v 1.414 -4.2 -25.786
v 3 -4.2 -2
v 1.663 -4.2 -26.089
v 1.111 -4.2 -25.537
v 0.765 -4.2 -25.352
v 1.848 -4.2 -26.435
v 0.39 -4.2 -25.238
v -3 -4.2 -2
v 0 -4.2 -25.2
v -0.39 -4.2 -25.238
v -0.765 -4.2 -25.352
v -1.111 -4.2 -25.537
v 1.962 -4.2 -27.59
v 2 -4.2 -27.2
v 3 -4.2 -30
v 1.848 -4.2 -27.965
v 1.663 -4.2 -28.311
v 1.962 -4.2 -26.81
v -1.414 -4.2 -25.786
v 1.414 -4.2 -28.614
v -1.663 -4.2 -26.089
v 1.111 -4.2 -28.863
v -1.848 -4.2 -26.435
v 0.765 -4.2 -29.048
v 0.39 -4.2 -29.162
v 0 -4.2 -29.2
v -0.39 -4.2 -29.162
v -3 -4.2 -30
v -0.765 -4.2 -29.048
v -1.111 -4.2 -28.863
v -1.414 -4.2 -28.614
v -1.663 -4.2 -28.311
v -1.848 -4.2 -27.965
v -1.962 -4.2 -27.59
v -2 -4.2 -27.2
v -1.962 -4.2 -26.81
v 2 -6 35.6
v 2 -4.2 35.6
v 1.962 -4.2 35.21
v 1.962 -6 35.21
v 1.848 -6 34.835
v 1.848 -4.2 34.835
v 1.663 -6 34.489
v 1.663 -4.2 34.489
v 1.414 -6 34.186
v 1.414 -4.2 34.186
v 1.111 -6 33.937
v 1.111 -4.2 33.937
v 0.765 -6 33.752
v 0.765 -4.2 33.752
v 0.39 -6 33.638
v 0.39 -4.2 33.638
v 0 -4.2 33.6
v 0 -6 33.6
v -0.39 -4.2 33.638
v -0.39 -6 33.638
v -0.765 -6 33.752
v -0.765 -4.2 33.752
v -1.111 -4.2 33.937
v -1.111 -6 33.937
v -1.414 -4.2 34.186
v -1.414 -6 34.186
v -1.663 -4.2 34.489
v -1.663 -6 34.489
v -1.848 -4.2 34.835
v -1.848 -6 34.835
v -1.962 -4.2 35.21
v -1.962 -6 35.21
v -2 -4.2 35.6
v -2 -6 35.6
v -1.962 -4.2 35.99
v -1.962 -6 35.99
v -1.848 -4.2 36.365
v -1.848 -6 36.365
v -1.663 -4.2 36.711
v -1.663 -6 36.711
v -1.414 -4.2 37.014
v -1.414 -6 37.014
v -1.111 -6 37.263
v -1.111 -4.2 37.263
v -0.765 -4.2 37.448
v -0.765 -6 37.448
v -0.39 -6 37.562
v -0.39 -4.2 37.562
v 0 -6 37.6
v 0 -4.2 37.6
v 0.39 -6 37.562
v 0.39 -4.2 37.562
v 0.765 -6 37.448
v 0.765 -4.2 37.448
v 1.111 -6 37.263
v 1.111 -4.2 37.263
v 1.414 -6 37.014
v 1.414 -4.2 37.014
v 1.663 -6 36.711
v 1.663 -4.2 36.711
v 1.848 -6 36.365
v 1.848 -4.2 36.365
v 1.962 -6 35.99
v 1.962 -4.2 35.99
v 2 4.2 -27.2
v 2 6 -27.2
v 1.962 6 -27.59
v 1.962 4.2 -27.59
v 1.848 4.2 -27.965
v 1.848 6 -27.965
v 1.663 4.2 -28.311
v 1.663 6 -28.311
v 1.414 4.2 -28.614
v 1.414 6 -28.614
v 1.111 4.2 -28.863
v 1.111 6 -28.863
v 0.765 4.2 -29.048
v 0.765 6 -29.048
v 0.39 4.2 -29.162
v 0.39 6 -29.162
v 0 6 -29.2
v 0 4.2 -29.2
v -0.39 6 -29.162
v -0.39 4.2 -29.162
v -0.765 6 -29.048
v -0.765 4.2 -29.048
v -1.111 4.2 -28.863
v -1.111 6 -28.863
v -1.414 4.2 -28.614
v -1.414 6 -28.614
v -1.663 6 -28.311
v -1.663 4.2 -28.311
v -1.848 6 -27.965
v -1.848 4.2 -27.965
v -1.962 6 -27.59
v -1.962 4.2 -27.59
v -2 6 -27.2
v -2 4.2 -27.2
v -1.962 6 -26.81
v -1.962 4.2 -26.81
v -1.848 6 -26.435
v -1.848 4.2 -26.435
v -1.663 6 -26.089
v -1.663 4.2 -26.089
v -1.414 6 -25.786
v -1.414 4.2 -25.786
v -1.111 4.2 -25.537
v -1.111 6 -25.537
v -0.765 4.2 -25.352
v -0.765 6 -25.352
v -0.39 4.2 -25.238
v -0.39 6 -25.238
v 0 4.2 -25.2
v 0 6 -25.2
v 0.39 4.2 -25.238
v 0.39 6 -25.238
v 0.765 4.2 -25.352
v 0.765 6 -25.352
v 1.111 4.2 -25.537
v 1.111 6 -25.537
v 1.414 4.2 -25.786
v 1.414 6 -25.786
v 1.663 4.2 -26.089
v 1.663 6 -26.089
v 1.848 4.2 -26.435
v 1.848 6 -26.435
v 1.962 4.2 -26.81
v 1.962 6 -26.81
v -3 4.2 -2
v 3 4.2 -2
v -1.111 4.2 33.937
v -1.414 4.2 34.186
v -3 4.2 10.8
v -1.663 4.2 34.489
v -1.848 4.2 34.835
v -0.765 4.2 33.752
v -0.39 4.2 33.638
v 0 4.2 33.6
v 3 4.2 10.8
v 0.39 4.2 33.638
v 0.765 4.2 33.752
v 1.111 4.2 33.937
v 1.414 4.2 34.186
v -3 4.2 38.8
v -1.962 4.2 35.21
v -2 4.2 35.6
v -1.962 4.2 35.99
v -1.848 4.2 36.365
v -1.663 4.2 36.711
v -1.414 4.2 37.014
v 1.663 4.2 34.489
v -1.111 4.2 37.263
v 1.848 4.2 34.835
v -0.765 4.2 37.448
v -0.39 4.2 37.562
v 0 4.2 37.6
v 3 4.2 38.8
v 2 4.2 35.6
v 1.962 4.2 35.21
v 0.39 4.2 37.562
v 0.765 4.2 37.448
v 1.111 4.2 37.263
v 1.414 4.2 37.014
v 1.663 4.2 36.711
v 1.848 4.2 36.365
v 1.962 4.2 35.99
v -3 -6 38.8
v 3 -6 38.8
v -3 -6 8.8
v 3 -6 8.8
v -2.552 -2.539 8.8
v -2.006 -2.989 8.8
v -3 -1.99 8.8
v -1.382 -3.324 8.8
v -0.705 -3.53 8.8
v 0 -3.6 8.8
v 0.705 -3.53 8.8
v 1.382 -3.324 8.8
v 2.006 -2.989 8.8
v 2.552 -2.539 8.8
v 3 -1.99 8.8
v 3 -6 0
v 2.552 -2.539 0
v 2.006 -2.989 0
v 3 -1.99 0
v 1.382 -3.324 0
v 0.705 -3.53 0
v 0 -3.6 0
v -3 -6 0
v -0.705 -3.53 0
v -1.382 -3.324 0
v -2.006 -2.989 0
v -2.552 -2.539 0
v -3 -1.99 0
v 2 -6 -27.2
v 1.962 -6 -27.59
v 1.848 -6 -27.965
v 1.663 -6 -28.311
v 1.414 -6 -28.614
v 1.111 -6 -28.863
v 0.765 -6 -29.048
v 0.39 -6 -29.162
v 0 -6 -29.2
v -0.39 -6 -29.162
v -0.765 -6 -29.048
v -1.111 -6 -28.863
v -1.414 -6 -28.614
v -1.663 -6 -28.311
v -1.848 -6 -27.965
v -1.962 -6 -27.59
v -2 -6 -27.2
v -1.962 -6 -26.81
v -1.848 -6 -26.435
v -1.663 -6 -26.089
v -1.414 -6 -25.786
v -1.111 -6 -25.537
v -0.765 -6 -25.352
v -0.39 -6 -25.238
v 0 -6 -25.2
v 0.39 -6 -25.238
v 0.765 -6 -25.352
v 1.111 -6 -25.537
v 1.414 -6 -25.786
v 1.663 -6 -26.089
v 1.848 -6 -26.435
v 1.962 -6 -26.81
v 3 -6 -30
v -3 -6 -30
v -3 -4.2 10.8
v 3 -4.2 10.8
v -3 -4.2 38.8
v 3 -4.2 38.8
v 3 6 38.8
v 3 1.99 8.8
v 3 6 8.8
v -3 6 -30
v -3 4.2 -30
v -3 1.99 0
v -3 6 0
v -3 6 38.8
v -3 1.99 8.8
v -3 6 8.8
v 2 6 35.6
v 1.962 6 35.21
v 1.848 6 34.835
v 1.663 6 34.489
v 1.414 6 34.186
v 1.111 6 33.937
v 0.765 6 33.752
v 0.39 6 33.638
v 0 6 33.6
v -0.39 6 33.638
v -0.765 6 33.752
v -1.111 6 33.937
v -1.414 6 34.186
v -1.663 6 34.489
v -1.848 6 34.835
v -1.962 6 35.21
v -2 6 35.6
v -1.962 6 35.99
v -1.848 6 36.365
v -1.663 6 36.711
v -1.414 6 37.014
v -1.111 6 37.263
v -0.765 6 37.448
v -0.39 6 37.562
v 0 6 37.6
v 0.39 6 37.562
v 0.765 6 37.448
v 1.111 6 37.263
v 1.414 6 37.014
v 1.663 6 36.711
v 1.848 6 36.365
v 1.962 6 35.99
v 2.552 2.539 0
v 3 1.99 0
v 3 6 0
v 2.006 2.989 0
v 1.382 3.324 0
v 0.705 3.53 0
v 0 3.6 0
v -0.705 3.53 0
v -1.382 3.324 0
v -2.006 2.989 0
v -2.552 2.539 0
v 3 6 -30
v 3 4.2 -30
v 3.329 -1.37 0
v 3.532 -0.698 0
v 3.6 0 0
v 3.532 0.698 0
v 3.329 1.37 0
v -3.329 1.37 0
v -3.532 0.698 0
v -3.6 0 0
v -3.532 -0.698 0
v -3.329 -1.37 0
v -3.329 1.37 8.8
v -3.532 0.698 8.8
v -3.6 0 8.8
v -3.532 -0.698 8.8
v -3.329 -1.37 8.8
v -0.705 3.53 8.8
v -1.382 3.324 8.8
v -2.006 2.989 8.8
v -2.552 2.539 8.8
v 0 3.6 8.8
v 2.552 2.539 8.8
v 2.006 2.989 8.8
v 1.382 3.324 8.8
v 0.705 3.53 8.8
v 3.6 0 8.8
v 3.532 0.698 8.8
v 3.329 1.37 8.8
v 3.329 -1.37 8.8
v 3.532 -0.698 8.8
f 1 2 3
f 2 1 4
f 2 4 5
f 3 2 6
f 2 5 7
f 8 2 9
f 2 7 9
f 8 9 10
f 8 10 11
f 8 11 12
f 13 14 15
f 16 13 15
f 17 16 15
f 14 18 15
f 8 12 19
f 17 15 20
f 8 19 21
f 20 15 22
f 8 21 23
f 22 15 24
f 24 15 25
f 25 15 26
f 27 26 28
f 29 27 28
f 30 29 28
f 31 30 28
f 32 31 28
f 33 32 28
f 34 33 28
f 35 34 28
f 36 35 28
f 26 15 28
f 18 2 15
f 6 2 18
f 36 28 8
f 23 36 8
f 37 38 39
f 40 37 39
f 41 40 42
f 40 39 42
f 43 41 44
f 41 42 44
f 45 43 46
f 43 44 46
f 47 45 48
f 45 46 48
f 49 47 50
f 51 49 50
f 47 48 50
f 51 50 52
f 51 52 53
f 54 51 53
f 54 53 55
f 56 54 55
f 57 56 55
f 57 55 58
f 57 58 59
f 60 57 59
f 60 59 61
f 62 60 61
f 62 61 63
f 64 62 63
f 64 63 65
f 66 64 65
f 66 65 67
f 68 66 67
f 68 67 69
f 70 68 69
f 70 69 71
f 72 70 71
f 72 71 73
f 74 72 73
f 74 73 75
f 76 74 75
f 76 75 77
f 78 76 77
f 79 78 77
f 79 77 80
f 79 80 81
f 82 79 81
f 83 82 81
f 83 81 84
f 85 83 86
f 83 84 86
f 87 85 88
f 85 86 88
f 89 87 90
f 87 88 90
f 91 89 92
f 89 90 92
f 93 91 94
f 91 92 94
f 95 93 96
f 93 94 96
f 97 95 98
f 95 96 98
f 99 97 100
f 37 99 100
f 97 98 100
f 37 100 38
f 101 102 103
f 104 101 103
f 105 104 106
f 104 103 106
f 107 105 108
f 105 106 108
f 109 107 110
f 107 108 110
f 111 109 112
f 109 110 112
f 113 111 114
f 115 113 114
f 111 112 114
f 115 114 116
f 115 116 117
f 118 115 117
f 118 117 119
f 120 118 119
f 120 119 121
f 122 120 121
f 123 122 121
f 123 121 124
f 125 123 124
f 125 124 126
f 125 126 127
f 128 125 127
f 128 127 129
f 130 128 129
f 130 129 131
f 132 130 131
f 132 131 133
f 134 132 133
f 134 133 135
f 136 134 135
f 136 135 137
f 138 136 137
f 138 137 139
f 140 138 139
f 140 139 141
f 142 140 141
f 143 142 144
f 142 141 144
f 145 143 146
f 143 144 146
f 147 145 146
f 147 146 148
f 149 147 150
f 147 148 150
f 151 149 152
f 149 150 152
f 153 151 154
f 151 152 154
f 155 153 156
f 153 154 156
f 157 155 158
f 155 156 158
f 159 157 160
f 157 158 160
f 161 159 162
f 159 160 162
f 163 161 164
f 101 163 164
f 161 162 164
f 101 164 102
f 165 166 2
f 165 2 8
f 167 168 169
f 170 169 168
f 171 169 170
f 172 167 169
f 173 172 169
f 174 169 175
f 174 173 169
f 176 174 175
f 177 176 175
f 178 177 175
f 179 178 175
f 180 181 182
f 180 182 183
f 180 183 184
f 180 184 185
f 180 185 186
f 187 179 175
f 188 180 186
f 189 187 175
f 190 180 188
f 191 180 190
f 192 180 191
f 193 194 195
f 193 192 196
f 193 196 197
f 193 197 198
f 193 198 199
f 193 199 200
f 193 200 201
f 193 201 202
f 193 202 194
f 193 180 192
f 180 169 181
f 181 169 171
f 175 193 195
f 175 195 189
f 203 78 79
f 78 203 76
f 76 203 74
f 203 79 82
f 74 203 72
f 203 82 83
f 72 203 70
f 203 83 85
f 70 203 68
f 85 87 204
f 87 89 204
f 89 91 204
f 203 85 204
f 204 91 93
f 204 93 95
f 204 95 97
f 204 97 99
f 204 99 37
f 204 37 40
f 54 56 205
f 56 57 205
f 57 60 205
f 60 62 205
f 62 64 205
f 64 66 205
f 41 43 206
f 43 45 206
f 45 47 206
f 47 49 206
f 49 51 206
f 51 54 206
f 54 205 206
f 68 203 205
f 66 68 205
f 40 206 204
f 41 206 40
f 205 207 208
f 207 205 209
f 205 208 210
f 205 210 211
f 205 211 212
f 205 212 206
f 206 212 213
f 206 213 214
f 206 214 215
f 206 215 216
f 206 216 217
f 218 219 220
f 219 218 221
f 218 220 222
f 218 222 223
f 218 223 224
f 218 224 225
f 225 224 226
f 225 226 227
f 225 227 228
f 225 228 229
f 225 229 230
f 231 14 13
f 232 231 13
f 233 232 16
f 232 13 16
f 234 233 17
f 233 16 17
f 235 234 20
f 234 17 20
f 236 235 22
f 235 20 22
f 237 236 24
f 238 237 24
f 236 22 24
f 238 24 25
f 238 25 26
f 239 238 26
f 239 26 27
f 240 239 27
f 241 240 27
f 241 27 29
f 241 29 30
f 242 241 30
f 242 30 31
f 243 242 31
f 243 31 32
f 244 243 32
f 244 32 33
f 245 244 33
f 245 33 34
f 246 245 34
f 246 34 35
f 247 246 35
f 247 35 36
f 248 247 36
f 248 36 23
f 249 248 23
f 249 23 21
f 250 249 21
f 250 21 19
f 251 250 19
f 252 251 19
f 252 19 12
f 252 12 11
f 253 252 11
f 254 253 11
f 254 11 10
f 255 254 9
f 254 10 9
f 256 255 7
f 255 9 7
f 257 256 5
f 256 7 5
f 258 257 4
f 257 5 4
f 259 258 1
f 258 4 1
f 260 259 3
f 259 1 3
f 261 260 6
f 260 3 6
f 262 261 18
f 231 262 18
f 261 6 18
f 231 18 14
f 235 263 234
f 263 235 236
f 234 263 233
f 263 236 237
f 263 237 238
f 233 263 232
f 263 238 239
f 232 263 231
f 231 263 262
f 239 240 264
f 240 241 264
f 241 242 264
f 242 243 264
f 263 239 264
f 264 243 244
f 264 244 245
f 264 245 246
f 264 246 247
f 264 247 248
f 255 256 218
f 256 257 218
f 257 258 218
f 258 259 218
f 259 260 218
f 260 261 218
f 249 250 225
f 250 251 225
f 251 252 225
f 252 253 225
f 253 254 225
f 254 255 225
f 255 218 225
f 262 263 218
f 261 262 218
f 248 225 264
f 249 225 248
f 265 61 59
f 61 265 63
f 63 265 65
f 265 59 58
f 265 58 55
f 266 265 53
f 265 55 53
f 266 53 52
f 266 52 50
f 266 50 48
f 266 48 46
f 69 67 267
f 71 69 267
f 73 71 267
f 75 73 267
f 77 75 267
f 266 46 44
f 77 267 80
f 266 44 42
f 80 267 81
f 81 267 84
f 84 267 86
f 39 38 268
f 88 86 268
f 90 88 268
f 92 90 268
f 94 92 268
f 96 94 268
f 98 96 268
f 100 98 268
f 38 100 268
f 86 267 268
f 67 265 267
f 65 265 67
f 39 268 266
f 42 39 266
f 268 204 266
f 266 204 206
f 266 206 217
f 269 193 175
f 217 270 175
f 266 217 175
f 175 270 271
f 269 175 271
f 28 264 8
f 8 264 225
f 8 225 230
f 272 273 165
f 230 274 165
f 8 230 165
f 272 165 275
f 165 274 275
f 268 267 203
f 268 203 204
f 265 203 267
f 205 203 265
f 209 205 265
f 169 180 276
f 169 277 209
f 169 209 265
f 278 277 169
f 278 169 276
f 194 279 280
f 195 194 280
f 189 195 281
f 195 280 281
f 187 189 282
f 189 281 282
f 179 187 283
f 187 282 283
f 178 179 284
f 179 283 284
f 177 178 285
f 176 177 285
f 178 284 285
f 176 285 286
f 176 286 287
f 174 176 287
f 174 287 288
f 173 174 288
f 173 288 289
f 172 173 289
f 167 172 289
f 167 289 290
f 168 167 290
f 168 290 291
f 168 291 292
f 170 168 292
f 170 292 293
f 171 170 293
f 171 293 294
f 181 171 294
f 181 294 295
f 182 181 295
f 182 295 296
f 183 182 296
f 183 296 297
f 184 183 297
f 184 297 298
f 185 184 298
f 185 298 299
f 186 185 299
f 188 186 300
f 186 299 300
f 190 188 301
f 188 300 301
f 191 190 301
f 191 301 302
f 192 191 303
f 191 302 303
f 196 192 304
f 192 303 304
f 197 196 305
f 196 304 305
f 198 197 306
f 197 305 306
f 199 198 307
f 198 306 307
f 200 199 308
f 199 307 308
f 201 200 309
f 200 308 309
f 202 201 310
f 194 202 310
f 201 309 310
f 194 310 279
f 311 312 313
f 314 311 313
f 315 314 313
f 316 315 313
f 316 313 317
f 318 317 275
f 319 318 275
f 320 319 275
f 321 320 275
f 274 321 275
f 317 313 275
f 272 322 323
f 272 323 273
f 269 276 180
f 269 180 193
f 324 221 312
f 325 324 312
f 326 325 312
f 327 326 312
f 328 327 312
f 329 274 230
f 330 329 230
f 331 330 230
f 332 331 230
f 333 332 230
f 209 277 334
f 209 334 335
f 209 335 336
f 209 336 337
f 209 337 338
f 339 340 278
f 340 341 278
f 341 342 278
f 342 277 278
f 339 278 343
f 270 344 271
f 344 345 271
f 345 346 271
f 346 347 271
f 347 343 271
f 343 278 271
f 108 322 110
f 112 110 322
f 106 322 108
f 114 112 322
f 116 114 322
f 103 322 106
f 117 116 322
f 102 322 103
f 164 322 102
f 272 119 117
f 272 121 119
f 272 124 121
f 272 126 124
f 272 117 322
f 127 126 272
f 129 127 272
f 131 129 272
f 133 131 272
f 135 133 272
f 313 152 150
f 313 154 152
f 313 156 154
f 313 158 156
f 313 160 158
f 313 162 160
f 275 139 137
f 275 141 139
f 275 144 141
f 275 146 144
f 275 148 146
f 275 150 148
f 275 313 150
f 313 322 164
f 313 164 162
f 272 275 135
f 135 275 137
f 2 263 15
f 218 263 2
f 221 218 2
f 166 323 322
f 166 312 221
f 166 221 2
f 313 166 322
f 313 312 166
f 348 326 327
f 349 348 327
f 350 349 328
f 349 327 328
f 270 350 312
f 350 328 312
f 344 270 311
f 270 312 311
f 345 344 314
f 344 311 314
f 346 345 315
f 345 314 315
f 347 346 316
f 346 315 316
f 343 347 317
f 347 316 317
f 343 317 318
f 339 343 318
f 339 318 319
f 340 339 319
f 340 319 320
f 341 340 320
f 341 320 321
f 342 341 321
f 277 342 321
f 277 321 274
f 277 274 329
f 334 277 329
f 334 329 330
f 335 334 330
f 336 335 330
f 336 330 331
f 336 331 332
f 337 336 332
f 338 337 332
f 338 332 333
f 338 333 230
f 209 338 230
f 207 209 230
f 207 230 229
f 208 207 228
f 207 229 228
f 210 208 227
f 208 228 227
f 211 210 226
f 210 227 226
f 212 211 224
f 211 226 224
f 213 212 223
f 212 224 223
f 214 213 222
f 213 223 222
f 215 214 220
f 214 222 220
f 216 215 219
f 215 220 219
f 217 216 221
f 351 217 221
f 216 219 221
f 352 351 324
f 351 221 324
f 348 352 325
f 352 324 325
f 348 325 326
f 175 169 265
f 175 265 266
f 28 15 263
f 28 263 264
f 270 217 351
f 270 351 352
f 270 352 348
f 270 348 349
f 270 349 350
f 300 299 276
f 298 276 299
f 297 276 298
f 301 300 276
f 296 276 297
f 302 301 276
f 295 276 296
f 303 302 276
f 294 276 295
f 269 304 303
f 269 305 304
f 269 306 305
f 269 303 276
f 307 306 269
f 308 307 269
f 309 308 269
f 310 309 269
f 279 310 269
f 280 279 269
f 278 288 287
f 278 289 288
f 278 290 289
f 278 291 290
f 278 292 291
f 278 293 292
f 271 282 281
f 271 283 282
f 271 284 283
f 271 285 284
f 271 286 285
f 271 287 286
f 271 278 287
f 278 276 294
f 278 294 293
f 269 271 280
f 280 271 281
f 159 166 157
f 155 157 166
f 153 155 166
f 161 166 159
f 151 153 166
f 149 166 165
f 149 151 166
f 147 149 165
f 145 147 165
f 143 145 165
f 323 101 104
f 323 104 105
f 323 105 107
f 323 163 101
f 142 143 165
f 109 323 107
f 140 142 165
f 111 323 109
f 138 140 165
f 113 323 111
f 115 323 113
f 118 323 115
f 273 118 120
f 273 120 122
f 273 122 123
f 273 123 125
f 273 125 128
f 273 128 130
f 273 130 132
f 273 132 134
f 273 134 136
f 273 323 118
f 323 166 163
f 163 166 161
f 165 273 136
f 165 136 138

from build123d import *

# Parameters (mm, degrees)
SKETCH_1_R          = 3.6
EXTRUDE_1_DEPTH     = 8.8
SKETCH_2_W          = 6
SKETCH_2_H          = 12
EXTRUDE_2_DEPTH     = 30
SKETCH_4_W          = 6
SKETCH_4_H          = 12
EXTRUDE_3_DEPTH     = 30
SKETCH_3_R          = 2
CUT_EXTRUDE_1_DEPTH = 30
SKETCH_5_W          = 6
SKETCH_5_H          = 8.4
CUT_EXTRUDE_2_DEPTH = 28
SKETCH_6_W          = 6
SKETCH_6_H          = 8.4
CUT_EXTRUDE_3_DEPTH = 28


with BuildPart() as part:
    # 草图1 → 凸台-拉伸1 (new body)
    with BuildSketch(Plane.XY):
        Circle(SKETCH_1_R)
    extrude(amount=EXTRUDE_1_DEPTH)

    # 草图2 → 凸台-拉伸2 (add)
    with BuildSketch(Plane.XY.offset(8.8)):
        Rectangle(SKETCH_2_W, SKETCH_2_H)
    extrude(amount=EXTRUDE_2_DEPTH)

    # 草图4 → 凸台-拉伸3 (add)
    with BuildSketch(Plane(origin=(0, 0, 0), x_dir=(-1, 0, 0), z_dir=(0, 0, -1))):
        Rectangle(SKETCH_4_W, SKETCH_4_H)
    extrude(amount=EXTRUDE_3_DEPTH)

    # 草图3 → 切除-拉伸1 (cut)
    with BuildSketch(Plane(origin=(0, 6, 0), x_dir=(1, 0, 0), z_dir=(0, 1, 0))):
        with Locations((0, -35.6)):
            Circle(SKETCH_3_R)
        with Locations((0, 27.2)):
            Circle(SKETCH_3_R)
    extrude(amount=-CUT_EXTRUDE_1_DEPTH, mode=Mode.SUBTRACT)

    # 草图5 → 切除-拉伸2 (cut)
    with BuildSketch(Plane(origin=(0, 0, -30), x_dir=(-1, 0, 0), z_dir=(0, 0, -1))):
        Rectangle(SKETCH_5_W, SKETCH_5_H)
    extrude(amount=-CUT_EXTRUDE_2_DEPTH, mode=Mode.SUBTRACT)

    # 草图6 → 切除-拉伸3 (cut)
    with BuildSketch(Plane.XY.offset(38.8)):
        Rectangle(SKETCH_6_W, SKETCH_6_H)
    extrude(amount=-CUT_EXTRUDE_3_DEPTH, mode=Mode.SUBTRACT)


solid = part.part
